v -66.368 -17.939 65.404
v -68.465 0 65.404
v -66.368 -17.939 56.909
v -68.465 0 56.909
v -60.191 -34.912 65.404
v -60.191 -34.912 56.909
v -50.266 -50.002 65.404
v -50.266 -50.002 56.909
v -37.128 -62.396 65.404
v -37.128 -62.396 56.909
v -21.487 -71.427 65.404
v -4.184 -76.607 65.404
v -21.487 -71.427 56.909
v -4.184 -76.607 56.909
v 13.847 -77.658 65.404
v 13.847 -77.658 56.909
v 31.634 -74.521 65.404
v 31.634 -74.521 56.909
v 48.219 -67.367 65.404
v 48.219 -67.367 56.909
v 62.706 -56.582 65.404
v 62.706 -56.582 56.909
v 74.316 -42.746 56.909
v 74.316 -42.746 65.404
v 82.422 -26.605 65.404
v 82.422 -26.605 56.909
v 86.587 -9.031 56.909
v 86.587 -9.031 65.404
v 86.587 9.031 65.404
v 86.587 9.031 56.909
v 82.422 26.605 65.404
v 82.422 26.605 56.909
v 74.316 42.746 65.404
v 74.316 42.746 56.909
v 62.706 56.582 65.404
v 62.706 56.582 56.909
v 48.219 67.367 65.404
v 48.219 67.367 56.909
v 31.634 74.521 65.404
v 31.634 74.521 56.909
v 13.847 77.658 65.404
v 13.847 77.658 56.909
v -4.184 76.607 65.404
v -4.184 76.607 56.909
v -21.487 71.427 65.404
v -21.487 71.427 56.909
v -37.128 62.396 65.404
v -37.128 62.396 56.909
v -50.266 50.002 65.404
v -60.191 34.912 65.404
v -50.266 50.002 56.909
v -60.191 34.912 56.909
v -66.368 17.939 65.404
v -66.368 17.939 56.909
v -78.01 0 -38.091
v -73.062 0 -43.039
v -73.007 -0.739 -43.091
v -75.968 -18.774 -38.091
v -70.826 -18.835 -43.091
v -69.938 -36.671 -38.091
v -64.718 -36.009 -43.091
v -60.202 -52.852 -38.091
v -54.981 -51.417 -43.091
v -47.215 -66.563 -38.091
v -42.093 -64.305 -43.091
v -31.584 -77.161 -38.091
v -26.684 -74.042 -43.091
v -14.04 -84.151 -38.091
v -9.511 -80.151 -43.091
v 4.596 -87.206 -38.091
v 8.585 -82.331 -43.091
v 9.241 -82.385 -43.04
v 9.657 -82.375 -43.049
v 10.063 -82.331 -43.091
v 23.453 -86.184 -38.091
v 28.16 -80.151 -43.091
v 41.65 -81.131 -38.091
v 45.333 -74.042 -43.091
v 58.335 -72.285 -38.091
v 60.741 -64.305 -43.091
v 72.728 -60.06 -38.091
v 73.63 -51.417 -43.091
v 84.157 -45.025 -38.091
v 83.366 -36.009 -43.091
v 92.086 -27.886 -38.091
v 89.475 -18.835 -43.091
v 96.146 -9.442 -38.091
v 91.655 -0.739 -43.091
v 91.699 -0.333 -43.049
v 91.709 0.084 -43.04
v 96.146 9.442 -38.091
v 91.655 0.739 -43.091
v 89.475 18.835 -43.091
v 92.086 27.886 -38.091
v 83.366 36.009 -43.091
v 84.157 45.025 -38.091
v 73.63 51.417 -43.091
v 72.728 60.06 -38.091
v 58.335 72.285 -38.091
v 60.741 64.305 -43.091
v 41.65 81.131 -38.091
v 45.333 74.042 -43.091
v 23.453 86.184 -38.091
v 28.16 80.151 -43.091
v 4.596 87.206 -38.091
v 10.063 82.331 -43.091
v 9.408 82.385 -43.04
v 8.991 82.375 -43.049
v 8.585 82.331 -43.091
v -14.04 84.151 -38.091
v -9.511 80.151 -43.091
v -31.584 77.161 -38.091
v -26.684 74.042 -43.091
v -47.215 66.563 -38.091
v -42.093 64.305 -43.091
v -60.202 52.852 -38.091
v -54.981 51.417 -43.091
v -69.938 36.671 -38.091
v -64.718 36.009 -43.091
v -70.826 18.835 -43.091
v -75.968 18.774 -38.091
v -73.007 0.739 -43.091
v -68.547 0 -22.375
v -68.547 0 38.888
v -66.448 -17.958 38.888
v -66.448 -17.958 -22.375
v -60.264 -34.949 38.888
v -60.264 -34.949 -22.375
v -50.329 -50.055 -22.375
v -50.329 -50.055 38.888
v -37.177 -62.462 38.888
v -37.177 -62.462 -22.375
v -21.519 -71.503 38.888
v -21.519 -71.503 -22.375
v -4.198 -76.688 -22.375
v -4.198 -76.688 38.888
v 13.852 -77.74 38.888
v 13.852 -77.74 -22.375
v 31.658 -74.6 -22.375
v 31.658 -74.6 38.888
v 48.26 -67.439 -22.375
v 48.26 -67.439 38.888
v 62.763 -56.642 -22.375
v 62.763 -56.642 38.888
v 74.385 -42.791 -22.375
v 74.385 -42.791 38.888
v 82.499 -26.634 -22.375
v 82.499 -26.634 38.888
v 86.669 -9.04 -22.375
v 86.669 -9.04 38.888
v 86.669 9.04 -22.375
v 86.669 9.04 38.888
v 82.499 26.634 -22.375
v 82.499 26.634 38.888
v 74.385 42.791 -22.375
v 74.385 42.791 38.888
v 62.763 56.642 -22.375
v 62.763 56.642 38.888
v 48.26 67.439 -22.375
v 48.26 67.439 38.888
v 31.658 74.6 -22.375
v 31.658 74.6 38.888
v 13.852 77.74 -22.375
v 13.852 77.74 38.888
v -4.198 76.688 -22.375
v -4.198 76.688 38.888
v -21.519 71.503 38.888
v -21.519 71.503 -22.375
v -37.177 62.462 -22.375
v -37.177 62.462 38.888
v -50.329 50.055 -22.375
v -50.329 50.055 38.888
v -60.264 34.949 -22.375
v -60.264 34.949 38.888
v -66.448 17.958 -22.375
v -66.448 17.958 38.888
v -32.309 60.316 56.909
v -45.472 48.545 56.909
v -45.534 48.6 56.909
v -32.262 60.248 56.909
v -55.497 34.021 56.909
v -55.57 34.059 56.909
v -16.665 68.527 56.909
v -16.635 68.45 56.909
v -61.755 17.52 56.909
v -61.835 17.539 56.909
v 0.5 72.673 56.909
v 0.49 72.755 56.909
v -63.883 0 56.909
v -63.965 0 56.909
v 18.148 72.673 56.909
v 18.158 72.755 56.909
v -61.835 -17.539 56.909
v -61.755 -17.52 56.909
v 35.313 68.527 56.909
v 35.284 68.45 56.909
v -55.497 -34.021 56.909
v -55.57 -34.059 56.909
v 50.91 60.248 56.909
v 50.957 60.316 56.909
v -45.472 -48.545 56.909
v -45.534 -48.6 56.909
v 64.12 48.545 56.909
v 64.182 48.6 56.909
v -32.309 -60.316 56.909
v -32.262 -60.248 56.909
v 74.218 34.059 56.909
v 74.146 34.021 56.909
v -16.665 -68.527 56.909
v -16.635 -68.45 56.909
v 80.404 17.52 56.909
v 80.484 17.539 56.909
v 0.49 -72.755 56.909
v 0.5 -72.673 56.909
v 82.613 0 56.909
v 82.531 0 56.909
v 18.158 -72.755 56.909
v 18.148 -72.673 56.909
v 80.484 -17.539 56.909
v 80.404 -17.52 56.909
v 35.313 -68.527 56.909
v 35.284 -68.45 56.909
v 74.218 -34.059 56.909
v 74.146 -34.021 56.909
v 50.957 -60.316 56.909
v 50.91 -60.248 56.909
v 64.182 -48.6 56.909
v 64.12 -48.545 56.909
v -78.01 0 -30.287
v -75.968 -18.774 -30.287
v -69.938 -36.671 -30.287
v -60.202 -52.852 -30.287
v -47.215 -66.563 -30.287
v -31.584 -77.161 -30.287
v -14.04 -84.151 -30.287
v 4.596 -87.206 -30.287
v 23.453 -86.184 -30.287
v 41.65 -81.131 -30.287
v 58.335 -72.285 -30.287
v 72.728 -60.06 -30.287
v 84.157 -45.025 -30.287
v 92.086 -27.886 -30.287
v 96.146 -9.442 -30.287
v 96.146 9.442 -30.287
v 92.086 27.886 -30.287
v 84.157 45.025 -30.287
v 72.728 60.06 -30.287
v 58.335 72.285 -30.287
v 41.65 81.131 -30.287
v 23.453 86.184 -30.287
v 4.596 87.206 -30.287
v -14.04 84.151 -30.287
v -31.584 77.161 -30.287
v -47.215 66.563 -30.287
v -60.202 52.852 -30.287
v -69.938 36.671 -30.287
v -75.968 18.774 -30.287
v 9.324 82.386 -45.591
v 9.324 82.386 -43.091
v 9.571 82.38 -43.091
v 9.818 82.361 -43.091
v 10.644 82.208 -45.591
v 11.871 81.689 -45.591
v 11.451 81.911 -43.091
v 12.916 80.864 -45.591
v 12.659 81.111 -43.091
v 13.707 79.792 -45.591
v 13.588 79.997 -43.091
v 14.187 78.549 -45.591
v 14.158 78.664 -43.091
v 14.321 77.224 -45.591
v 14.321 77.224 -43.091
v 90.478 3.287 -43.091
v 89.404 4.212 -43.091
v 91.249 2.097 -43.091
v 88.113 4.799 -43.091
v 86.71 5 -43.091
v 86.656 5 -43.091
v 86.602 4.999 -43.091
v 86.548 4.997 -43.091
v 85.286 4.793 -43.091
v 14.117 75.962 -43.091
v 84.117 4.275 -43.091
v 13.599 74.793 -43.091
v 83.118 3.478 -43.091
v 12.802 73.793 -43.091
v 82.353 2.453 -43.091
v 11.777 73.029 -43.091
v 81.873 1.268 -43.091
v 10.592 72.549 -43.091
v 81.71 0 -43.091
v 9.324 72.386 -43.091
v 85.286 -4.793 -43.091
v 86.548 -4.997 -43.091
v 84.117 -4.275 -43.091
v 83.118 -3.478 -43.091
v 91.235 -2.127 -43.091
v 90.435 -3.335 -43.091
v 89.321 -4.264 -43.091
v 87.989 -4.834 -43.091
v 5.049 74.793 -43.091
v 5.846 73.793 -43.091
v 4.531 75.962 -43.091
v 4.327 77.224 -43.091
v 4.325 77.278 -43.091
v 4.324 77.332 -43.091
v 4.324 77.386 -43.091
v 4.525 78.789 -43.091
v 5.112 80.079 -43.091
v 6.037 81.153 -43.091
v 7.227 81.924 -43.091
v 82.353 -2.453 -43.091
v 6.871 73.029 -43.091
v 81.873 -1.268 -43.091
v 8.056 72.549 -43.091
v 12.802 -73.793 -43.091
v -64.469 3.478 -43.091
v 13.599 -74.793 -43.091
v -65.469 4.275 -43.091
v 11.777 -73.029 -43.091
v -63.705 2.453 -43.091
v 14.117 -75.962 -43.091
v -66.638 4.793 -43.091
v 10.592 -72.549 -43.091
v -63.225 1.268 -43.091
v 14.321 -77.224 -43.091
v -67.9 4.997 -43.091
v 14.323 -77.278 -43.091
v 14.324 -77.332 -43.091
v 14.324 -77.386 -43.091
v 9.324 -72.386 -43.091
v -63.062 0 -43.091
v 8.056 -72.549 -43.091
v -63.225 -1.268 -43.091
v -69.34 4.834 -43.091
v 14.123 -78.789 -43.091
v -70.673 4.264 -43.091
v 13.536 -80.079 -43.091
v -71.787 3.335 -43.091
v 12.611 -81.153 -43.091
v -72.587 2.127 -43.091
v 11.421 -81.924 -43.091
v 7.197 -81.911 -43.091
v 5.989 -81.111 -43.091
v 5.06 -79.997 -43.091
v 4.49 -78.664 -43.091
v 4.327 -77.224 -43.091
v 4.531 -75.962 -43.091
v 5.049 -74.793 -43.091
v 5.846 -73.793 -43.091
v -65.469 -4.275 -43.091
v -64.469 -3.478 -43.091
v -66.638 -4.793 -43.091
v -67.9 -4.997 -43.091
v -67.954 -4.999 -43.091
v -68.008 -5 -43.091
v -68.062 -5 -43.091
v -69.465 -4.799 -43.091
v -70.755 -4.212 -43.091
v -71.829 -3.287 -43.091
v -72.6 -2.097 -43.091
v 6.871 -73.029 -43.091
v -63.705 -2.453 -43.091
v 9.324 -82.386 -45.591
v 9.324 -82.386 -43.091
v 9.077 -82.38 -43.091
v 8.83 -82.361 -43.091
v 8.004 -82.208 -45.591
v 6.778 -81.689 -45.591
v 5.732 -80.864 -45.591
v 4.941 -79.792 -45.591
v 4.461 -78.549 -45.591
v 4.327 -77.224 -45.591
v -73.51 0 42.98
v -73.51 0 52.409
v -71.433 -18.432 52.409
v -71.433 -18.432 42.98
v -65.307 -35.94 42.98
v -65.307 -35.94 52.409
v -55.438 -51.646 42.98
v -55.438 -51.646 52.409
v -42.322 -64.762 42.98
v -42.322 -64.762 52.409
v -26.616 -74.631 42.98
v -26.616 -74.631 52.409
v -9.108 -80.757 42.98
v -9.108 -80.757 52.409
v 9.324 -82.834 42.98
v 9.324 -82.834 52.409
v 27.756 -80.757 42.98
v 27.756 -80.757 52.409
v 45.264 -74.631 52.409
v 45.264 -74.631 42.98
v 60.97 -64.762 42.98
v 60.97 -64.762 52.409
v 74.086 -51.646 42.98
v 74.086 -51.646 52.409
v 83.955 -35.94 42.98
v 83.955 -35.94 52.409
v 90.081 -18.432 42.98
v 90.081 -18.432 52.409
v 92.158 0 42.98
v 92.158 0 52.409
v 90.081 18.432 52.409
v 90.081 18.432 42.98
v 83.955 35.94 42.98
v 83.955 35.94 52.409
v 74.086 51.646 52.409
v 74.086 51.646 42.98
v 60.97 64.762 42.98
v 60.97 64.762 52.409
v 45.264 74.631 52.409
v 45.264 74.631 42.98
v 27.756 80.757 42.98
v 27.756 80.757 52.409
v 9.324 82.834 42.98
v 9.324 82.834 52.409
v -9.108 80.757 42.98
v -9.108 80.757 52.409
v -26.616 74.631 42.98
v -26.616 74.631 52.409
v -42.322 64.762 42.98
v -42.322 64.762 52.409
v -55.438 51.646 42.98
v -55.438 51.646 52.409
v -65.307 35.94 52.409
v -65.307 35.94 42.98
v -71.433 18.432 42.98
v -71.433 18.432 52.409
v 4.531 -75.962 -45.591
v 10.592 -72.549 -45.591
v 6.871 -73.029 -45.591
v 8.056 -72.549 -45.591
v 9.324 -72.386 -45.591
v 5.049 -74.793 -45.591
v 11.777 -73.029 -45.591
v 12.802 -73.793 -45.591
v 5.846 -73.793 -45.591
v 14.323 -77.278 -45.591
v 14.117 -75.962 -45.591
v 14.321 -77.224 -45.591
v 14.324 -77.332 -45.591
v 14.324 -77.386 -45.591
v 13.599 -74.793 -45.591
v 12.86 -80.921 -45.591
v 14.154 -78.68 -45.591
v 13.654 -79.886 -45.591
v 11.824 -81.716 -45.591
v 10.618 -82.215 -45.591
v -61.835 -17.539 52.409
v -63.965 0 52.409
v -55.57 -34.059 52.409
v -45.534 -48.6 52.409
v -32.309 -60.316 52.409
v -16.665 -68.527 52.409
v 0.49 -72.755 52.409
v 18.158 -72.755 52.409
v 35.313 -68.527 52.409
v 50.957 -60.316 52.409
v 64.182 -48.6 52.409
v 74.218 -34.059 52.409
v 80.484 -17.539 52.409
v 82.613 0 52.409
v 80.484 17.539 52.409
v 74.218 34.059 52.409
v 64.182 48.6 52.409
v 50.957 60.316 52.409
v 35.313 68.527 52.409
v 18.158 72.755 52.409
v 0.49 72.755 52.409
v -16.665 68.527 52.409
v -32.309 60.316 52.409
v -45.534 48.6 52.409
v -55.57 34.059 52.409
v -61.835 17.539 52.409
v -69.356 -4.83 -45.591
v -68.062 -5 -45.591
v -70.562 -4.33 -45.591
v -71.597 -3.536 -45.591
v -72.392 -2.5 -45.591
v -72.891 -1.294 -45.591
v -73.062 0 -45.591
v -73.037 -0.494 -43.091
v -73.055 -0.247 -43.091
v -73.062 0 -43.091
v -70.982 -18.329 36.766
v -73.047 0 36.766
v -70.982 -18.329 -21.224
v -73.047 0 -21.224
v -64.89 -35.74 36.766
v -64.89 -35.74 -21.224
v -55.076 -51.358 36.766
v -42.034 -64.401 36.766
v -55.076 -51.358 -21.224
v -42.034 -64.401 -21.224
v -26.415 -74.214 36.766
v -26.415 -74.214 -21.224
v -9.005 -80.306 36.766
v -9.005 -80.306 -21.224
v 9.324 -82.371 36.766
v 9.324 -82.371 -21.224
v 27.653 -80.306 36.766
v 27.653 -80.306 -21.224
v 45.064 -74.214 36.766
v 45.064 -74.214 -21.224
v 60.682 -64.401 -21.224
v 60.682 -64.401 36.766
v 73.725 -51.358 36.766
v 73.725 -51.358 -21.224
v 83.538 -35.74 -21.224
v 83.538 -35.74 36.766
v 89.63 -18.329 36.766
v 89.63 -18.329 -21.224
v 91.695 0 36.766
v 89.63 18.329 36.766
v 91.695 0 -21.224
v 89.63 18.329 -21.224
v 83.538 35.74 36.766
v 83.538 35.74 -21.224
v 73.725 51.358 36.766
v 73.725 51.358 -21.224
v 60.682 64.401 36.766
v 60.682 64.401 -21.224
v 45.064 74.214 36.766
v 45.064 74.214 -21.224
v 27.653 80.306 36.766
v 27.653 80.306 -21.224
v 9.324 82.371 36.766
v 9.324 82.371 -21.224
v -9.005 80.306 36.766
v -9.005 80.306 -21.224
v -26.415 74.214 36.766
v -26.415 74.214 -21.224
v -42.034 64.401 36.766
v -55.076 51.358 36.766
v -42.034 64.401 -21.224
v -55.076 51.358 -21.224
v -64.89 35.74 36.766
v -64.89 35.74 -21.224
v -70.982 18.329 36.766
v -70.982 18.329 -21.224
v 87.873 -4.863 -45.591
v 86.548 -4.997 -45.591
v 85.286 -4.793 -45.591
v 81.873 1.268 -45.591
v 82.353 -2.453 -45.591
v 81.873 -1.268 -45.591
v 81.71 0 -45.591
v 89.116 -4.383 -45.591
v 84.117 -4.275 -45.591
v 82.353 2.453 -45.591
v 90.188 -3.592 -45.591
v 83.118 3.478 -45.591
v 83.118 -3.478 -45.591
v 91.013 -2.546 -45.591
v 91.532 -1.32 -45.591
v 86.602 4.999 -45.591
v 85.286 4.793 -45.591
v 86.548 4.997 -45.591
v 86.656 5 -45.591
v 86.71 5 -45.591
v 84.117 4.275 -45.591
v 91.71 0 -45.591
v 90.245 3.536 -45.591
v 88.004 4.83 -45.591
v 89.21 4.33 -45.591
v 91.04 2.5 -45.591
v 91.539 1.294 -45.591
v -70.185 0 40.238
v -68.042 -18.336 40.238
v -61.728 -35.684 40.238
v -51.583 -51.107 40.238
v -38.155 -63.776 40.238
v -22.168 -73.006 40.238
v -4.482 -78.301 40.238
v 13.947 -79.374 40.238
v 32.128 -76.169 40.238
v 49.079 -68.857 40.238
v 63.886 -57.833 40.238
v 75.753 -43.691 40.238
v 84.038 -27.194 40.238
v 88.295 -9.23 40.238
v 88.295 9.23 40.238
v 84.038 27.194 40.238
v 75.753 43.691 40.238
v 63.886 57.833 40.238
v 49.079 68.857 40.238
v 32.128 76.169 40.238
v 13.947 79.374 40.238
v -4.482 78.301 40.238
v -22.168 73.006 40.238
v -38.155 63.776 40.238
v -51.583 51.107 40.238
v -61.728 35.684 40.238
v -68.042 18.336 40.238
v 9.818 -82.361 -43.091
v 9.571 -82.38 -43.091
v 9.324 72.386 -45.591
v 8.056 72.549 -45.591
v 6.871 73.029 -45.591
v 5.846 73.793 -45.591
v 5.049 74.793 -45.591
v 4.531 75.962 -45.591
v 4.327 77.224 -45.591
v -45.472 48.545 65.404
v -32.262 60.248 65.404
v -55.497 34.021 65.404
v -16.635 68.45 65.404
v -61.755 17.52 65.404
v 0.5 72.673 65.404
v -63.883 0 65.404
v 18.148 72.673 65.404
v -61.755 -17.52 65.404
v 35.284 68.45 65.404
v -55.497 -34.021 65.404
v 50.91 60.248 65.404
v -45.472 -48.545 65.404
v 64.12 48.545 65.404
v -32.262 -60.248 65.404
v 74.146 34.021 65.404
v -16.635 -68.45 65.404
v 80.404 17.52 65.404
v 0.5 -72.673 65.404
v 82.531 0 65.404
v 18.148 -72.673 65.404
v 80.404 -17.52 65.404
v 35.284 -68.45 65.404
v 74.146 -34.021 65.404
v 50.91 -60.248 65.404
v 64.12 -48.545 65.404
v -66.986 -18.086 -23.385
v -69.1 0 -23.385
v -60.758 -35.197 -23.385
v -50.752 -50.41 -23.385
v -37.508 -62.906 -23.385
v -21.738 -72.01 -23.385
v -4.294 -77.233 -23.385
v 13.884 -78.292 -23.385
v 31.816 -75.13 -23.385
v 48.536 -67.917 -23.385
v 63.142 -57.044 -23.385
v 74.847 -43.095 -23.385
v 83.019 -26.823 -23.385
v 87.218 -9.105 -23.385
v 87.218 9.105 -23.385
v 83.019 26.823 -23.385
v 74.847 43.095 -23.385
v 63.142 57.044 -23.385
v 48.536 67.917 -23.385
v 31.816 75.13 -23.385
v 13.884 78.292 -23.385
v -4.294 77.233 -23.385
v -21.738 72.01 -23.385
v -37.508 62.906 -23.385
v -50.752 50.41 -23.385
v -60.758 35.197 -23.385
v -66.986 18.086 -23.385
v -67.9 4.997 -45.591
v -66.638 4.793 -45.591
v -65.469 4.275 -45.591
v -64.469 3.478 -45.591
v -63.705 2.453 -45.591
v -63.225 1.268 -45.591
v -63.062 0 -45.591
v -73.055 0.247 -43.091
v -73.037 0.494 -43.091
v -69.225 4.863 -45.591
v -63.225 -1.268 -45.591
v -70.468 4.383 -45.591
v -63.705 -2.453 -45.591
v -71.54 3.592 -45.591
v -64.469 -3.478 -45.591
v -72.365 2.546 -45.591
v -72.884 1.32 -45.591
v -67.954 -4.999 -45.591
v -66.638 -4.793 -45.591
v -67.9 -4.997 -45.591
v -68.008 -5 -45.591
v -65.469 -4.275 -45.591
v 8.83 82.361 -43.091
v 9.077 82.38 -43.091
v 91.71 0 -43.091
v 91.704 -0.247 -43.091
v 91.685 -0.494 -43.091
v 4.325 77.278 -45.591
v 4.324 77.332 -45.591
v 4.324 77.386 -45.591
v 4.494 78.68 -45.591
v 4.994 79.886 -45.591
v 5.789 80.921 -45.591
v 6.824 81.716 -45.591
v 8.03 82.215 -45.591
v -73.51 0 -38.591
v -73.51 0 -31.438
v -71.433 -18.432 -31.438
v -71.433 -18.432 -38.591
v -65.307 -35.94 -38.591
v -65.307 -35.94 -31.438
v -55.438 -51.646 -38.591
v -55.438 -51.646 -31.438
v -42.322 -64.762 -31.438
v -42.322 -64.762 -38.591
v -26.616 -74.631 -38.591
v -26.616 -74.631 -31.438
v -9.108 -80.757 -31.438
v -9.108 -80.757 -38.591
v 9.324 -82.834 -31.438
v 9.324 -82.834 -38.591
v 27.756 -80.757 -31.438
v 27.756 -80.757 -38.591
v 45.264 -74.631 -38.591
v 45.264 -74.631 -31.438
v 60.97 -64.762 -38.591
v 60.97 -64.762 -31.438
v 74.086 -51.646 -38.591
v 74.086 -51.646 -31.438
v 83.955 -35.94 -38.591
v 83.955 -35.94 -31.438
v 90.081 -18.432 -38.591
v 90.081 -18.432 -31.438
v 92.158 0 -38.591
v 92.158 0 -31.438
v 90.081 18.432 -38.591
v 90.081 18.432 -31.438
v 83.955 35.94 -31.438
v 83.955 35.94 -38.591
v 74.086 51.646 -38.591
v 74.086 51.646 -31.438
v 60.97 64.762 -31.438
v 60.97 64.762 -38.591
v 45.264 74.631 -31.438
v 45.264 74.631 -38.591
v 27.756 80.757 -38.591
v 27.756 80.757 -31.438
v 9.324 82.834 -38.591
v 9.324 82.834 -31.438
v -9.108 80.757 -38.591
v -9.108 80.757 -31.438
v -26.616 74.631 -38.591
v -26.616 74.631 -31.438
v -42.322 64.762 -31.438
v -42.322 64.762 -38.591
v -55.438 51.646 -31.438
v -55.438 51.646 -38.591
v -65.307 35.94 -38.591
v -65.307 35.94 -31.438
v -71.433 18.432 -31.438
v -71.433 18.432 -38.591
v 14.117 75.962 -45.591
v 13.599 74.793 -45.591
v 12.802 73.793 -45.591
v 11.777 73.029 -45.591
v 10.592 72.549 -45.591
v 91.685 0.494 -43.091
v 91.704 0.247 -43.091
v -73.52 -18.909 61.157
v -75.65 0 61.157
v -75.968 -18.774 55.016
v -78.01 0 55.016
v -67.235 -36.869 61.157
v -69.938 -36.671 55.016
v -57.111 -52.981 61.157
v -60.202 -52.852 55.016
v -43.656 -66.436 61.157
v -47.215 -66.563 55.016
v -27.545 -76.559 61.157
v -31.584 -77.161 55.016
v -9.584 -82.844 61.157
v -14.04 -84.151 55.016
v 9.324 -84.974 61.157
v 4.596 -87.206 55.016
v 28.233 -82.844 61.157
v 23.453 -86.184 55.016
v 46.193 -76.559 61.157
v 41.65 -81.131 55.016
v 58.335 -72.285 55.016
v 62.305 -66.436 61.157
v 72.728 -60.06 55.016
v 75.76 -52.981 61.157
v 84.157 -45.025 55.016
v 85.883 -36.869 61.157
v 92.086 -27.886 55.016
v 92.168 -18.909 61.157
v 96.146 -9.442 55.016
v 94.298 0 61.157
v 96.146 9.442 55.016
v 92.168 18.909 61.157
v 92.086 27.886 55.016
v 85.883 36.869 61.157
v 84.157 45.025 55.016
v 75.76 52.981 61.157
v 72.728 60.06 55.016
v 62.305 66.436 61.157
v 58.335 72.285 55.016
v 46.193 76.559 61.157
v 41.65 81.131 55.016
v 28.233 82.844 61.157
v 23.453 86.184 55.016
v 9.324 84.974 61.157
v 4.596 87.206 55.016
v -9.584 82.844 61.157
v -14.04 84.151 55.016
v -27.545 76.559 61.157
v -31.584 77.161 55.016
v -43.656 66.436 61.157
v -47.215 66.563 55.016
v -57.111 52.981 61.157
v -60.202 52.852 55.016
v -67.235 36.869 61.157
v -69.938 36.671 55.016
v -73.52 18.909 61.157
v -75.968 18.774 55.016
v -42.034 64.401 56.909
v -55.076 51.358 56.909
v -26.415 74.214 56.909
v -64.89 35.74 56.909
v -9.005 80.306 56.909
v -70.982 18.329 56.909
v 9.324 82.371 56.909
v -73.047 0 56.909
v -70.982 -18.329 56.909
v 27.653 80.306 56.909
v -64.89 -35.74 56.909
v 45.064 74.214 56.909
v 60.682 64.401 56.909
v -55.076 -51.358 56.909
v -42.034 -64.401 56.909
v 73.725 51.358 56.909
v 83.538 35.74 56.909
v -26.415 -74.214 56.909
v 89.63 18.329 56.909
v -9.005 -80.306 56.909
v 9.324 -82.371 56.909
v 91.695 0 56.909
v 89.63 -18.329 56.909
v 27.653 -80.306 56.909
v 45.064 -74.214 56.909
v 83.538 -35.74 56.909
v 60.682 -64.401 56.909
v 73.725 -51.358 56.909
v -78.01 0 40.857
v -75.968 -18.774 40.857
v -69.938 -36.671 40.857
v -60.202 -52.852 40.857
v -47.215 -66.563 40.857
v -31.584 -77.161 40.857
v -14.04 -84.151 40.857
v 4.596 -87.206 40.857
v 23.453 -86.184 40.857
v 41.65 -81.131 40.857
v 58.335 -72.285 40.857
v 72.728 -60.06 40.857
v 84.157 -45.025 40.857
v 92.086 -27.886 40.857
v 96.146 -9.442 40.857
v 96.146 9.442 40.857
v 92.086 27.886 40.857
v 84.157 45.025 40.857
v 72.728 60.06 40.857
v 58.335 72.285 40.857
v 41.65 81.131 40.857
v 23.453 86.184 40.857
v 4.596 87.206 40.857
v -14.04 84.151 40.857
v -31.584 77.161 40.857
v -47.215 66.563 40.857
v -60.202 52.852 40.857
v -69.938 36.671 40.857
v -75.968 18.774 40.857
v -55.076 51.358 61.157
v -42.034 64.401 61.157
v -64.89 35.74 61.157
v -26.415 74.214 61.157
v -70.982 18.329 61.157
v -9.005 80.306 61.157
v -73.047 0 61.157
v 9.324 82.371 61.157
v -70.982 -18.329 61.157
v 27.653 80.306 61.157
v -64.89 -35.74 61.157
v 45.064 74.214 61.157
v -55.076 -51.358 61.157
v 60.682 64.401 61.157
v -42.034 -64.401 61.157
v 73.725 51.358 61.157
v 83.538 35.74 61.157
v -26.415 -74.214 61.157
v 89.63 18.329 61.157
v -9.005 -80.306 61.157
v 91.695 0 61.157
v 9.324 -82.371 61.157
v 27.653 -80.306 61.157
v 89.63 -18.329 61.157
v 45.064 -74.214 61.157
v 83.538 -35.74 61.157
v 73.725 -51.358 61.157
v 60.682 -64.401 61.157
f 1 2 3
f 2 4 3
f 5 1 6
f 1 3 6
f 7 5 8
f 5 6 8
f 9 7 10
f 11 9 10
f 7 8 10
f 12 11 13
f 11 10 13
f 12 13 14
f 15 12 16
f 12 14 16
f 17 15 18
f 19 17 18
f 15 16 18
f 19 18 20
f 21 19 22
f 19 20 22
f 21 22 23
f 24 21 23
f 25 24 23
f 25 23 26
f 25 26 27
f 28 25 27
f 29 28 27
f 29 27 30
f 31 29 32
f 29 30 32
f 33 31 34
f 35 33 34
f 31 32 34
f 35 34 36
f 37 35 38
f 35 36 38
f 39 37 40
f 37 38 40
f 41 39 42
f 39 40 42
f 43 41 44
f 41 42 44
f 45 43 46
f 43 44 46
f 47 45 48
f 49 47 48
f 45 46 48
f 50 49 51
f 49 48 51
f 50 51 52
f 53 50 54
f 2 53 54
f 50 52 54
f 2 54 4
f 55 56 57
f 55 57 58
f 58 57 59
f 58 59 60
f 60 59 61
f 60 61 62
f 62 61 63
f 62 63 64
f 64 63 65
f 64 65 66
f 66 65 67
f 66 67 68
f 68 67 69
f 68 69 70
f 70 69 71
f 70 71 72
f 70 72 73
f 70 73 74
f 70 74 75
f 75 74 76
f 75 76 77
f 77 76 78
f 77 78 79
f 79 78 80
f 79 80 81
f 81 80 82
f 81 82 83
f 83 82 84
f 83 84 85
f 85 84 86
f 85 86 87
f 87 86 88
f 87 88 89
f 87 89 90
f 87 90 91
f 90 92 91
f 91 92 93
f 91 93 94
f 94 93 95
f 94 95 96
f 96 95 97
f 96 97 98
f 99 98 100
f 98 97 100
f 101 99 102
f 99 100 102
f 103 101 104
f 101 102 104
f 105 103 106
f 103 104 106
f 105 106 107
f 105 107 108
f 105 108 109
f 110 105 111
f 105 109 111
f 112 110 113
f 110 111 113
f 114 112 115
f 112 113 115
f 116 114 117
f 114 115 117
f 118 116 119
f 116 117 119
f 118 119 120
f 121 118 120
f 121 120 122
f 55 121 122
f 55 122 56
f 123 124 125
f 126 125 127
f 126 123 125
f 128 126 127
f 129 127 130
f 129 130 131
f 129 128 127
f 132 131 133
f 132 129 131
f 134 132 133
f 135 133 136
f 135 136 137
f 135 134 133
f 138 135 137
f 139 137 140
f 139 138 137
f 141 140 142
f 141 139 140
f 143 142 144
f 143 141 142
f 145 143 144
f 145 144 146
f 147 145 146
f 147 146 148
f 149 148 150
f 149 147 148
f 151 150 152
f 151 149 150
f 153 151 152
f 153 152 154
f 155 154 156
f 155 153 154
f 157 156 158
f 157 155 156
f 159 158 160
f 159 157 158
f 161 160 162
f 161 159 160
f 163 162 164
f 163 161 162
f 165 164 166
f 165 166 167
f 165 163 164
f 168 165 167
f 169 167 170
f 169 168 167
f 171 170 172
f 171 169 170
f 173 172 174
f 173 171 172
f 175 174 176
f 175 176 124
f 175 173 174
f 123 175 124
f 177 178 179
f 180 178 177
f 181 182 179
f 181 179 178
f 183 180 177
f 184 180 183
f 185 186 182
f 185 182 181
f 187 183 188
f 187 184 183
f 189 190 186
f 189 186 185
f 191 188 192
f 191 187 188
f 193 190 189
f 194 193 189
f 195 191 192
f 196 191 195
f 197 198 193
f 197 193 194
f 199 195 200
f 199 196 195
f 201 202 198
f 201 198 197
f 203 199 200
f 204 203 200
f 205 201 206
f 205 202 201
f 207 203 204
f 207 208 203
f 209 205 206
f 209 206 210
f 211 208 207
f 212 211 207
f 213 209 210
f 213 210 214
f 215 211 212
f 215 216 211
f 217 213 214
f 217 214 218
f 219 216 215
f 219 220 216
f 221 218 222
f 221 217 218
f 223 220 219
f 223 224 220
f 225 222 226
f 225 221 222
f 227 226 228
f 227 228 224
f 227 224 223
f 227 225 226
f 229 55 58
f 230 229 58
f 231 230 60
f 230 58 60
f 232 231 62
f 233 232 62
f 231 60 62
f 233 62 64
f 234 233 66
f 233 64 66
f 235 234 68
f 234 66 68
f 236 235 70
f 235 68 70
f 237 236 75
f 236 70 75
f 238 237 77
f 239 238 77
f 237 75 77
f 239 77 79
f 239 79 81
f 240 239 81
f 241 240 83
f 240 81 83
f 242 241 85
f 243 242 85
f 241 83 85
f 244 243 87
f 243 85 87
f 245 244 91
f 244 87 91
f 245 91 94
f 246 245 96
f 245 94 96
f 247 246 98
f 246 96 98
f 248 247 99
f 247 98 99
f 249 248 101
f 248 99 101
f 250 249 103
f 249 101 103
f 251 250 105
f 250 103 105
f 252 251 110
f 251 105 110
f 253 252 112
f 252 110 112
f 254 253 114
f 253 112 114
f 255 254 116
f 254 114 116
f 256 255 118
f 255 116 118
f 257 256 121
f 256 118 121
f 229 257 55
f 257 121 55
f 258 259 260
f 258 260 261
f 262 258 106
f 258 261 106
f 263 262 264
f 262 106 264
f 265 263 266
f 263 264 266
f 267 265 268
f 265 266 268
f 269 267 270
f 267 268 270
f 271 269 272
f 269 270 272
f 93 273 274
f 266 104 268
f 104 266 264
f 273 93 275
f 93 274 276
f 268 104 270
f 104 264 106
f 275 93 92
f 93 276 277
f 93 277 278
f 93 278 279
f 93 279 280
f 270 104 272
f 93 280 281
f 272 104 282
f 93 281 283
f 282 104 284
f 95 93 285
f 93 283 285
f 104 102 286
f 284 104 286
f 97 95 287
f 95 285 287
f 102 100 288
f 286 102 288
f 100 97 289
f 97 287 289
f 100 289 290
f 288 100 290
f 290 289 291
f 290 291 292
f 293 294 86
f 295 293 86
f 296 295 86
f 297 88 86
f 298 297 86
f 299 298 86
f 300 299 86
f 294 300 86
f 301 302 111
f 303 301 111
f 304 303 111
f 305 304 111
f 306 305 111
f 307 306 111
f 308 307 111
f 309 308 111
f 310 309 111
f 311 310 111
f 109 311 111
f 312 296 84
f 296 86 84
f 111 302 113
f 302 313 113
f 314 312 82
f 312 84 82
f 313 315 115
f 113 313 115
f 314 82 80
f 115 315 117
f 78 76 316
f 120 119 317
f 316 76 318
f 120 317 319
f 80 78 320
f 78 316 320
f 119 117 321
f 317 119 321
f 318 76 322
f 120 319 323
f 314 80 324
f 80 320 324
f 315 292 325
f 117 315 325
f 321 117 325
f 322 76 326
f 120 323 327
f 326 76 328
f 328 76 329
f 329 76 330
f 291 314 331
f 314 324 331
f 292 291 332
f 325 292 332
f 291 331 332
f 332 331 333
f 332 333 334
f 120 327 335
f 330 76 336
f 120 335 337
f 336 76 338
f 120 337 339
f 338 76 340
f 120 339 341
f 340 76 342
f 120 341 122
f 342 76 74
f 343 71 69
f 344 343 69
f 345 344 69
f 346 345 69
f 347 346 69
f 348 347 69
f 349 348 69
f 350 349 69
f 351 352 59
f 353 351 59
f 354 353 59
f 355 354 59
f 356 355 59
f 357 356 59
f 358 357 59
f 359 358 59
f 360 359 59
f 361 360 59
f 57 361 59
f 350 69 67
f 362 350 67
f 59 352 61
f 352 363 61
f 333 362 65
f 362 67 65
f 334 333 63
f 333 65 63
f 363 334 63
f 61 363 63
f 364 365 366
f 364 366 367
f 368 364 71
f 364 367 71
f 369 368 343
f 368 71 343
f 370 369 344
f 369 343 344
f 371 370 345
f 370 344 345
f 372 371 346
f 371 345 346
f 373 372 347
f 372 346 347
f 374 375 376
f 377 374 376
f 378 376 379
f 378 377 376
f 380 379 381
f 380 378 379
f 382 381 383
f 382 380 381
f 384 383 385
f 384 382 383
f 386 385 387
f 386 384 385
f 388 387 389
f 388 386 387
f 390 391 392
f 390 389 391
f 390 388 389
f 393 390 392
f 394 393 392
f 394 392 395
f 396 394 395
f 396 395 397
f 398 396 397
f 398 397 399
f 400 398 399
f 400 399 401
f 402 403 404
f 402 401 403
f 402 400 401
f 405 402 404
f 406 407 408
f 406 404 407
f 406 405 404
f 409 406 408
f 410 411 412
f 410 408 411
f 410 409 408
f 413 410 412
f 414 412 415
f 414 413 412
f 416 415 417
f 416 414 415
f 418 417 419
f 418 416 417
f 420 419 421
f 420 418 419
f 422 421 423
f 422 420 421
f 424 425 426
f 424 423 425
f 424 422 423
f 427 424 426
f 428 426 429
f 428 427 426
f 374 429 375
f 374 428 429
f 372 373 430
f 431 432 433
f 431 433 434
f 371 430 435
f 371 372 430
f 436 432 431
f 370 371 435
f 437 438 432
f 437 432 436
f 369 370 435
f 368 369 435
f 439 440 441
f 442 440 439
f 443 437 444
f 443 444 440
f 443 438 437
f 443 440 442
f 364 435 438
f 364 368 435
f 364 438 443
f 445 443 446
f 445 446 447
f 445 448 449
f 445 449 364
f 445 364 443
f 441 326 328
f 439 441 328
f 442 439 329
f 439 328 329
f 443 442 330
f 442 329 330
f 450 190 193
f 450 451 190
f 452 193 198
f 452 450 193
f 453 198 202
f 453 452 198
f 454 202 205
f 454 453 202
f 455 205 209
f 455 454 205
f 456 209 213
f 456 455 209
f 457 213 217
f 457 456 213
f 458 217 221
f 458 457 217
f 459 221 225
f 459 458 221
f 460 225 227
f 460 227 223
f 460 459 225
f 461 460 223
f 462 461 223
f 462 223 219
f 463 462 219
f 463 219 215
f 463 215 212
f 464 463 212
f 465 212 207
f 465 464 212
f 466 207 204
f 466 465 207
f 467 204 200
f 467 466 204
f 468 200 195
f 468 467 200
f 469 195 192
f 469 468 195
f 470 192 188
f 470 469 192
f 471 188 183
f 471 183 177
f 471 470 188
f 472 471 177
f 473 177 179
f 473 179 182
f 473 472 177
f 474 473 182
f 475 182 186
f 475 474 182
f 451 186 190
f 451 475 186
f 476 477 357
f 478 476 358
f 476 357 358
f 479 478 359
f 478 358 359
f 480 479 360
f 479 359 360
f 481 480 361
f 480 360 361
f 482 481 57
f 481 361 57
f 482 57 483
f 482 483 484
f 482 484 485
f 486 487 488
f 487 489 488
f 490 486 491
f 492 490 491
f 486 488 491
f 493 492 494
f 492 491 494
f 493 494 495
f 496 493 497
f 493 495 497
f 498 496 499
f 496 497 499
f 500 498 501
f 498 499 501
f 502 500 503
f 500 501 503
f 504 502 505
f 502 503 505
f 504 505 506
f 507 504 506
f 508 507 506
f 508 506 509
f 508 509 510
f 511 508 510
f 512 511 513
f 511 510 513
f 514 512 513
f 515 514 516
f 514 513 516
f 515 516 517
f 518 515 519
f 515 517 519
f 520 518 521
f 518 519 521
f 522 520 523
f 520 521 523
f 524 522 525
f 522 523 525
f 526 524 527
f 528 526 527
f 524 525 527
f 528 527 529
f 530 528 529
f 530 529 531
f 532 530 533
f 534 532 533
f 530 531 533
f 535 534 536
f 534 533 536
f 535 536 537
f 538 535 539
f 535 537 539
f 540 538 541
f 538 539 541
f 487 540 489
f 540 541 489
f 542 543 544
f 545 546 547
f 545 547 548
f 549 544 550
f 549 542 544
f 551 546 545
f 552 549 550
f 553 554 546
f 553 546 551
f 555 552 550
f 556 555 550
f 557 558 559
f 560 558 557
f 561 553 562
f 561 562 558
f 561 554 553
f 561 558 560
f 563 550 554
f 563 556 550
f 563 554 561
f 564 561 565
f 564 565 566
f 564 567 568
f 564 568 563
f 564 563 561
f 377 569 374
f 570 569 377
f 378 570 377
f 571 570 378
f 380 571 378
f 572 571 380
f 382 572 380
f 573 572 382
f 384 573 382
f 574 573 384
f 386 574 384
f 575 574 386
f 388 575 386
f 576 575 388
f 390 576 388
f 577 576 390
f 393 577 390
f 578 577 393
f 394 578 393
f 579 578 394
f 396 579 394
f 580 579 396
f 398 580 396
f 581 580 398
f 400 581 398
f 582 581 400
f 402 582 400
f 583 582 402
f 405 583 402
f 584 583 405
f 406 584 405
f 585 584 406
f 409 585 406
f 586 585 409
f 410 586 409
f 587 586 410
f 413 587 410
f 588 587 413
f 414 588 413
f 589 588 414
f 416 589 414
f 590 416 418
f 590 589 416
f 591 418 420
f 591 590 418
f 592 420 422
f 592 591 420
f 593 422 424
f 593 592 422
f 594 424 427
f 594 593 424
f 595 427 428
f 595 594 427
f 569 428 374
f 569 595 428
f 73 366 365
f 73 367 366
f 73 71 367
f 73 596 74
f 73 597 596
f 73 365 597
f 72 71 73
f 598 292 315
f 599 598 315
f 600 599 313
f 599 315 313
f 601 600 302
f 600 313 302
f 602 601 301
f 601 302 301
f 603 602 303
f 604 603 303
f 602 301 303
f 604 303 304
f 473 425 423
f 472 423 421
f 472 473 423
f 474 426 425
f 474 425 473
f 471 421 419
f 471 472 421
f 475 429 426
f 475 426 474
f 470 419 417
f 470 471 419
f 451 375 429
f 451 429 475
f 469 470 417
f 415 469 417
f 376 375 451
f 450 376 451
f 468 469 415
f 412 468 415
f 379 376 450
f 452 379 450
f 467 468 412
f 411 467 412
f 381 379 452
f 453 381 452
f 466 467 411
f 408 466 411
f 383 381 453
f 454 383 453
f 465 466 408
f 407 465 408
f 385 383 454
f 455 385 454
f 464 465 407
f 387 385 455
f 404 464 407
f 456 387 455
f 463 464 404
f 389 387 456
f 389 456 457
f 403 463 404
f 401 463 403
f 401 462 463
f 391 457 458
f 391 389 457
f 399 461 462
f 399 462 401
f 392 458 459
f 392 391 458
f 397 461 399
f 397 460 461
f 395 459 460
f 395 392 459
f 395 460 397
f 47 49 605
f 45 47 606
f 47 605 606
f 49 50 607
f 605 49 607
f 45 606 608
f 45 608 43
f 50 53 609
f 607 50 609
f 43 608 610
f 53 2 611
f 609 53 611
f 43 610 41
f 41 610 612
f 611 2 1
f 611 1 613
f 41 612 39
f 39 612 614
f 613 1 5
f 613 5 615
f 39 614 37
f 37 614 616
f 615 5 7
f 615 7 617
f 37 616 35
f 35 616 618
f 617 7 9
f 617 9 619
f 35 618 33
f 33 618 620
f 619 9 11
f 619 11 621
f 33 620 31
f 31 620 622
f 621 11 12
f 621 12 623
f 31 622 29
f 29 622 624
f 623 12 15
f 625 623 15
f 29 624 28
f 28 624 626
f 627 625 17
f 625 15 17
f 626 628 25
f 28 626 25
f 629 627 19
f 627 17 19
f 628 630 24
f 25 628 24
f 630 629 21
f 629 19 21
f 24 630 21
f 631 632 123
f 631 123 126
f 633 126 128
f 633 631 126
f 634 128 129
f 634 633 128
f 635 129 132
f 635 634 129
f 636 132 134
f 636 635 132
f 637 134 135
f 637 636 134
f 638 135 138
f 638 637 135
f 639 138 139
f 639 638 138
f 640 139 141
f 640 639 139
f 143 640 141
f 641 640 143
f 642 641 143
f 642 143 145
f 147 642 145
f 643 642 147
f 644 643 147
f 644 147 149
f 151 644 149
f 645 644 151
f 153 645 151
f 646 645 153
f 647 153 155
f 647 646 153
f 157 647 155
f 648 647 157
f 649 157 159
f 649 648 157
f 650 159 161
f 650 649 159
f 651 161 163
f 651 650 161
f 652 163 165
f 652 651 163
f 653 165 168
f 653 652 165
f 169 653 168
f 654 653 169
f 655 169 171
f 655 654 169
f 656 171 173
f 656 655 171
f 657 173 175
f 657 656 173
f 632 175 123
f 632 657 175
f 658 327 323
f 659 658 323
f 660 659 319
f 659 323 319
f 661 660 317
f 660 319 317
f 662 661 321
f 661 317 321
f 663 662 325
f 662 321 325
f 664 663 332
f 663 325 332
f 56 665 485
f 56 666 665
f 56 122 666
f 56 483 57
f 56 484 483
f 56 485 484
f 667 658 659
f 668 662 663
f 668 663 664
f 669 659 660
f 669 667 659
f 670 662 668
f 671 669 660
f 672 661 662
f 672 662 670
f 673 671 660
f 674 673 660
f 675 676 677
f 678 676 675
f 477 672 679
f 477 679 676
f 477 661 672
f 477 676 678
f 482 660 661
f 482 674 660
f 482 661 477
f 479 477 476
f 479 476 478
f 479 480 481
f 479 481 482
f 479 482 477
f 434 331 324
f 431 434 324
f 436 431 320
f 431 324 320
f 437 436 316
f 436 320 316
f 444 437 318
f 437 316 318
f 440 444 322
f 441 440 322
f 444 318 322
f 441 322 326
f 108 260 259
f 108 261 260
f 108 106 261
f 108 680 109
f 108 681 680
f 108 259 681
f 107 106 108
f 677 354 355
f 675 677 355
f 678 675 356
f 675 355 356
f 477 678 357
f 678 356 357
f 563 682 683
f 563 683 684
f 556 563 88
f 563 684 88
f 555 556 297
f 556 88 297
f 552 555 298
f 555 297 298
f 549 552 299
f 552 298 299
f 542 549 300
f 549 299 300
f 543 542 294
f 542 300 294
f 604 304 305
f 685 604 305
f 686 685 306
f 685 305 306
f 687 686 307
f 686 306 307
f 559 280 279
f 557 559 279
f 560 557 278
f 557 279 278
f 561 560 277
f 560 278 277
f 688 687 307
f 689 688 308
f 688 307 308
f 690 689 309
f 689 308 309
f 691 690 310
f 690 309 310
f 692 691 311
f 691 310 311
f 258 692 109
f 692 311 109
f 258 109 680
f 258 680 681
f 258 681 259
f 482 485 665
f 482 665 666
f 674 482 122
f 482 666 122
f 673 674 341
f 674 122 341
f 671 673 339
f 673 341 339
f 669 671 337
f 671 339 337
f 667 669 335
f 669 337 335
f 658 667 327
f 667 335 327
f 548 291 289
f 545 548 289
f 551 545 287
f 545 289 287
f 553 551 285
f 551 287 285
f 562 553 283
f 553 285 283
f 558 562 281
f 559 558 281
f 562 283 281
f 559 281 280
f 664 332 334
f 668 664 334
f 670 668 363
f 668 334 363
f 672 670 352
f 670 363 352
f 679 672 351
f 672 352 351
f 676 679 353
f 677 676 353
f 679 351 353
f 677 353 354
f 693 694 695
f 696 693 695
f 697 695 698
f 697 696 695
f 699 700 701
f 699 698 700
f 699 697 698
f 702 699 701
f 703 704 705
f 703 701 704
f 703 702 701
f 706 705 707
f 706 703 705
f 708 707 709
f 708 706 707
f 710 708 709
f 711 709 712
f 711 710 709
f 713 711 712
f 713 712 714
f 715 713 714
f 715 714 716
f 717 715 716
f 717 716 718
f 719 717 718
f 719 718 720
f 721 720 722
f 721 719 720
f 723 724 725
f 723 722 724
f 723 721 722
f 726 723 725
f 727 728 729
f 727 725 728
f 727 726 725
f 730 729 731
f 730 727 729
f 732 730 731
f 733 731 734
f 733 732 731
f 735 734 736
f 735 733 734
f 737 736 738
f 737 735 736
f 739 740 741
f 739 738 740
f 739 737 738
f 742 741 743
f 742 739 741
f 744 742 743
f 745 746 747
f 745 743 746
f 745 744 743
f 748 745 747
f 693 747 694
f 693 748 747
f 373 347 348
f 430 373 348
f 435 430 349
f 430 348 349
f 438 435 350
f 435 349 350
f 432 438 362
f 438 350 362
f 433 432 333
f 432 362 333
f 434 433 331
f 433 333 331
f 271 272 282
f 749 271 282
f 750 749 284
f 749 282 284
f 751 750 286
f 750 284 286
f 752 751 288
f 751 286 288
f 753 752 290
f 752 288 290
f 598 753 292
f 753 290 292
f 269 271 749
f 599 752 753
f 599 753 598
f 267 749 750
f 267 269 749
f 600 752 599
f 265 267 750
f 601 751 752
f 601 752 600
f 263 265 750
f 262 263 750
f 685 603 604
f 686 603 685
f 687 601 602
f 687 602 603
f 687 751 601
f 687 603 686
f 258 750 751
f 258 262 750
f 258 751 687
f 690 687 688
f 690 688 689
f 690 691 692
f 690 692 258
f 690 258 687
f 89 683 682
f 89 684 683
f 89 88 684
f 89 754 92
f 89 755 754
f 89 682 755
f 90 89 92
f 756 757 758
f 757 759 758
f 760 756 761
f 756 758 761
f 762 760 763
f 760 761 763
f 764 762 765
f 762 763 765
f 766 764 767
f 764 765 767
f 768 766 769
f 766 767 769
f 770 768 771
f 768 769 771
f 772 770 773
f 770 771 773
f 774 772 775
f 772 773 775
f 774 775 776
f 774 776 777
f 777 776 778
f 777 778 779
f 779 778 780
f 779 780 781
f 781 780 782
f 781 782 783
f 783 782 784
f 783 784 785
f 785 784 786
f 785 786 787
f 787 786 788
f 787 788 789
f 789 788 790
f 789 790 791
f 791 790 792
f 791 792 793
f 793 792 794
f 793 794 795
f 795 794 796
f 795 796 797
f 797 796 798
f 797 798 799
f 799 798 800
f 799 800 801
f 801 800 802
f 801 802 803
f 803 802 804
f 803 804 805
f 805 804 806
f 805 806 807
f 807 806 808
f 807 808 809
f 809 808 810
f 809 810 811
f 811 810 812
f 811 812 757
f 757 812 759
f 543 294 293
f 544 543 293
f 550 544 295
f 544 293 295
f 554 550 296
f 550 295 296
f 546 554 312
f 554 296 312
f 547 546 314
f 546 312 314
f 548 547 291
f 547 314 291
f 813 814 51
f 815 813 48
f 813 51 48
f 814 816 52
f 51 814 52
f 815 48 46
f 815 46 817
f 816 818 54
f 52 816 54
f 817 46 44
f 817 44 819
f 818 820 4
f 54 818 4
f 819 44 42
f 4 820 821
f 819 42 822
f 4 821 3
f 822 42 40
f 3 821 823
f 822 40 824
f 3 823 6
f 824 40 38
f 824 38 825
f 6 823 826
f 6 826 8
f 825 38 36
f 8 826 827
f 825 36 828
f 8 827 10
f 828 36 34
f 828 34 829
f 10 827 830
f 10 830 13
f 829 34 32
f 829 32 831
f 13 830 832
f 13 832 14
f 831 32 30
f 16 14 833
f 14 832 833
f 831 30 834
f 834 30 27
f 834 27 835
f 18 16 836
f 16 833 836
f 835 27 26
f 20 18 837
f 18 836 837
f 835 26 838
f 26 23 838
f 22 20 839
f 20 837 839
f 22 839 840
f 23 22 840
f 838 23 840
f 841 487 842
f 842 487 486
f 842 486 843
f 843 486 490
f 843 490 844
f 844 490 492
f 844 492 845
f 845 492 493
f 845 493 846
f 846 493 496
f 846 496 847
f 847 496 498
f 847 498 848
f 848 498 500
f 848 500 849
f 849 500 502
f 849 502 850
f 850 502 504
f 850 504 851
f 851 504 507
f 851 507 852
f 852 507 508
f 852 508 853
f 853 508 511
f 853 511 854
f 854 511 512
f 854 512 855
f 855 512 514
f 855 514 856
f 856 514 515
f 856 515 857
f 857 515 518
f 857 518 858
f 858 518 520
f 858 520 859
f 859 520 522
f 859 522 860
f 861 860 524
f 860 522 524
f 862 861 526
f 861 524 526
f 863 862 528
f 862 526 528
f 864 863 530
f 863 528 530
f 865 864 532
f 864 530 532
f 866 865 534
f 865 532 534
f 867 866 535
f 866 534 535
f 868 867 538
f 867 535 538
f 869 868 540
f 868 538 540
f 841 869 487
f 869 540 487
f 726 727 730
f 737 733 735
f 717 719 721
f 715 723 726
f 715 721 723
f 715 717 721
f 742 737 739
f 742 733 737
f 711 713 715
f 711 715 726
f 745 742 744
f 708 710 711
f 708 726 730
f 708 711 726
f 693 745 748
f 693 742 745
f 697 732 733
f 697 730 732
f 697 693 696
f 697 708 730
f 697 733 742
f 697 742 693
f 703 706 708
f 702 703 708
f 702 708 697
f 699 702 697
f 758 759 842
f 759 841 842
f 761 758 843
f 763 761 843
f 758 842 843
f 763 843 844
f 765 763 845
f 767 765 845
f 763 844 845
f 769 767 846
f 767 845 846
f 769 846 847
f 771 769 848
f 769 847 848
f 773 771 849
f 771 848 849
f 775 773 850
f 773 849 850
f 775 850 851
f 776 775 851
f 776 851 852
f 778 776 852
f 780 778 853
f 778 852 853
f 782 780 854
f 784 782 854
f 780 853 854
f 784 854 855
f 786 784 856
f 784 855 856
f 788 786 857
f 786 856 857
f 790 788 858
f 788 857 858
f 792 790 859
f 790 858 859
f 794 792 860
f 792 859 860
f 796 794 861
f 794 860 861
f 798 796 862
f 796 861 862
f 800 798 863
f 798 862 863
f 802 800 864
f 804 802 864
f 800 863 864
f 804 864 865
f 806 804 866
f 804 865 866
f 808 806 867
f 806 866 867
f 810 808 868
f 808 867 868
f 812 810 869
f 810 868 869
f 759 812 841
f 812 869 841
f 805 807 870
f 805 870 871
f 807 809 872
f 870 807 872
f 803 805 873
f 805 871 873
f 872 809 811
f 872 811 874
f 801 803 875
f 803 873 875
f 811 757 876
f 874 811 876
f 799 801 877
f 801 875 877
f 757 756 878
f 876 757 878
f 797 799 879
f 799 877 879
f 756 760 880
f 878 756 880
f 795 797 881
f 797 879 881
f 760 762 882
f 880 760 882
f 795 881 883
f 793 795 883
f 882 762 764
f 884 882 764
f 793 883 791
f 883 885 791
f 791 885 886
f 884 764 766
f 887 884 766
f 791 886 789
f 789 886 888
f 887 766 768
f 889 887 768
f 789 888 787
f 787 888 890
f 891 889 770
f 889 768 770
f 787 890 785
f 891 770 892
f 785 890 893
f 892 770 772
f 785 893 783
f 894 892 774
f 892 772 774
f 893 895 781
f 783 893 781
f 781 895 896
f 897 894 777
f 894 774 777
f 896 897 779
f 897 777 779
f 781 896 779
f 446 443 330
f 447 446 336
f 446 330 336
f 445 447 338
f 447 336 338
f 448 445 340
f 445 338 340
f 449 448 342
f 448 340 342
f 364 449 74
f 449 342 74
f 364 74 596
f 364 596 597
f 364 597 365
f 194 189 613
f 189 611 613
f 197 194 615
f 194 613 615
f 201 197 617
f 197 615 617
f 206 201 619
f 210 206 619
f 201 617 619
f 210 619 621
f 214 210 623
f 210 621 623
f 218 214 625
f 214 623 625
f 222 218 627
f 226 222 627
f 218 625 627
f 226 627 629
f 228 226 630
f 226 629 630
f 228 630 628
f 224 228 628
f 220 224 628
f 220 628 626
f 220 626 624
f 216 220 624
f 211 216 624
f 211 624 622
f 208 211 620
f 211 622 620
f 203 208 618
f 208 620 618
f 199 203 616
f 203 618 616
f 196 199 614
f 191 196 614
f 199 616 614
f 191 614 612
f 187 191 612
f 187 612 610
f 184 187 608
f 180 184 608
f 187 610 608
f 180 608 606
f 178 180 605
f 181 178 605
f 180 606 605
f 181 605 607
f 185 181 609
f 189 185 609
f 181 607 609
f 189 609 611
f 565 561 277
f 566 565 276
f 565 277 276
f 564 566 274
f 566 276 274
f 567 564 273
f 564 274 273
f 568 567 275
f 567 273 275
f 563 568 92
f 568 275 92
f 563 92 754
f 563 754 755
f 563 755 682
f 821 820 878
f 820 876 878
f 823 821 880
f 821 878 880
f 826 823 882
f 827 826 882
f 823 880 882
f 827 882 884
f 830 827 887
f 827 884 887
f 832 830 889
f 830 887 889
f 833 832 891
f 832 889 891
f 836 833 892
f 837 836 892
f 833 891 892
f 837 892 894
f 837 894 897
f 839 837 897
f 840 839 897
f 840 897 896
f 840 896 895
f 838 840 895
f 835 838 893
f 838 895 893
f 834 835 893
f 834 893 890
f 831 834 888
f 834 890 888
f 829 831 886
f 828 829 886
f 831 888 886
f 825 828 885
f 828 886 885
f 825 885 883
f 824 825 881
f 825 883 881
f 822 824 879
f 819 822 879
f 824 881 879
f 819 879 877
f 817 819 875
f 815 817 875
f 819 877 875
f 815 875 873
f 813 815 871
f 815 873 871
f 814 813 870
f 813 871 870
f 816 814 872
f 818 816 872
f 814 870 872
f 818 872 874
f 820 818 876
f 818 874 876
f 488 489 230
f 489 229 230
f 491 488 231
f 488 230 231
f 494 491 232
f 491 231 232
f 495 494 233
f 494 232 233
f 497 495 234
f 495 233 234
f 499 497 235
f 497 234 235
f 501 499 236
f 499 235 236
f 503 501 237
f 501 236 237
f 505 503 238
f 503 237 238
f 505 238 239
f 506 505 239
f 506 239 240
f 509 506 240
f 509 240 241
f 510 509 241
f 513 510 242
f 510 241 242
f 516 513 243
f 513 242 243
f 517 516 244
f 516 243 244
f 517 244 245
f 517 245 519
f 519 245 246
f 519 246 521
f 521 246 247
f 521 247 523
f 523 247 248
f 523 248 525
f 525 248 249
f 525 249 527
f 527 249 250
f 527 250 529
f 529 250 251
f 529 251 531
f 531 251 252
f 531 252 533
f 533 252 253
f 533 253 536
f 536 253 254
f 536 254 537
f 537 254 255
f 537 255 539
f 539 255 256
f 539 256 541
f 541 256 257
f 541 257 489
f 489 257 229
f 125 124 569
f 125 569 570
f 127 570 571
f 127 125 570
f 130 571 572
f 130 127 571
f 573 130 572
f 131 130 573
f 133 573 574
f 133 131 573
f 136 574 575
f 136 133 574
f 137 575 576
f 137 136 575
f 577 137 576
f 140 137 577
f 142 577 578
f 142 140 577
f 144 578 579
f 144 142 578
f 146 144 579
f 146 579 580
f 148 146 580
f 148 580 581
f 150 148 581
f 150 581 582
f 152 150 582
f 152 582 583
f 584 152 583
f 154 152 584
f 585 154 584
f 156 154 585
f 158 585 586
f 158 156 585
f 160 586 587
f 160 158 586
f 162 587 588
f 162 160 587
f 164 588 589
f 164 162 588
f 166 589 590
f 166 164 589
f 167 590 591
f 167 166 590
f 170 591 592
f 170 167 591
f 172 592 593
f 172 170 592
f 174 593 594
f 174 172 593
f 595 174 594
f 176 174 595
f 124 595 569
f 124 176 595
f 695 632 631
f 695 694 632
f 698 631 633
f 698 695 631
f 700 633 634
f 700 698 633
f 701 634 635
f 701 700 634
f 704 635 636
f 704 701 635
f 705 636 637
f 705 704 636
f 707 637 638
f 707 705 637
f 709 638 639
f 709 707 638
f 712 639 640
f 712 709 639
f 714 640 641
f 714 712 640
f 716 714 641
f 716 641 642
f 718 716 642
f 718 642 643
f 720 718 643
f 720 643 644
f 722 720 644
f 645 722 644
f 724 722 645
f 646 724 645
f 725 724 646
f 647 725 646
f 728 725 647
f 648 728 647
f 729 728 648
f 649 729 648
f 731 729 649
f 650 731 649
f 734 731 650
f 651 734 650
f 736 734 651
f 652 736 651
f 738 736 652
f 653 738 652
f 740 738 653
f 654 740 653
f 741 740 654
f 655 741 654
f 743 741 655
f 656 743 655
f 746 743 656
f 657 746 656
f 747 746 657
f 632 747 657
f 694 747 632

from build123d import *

# Parameters (mm, degrees)
F2_T            = 4.5
F4_DEPTH        = 2.5
F4_COPIES_COUNT = 4
F5_S5_R         = 5
F5_T6_DEPTH     = 125
F5_S7_R         = 5
F5_T8_DEPTH     = 125
F5_S9_R         = 5
F5_T10_DEPTH    = 125
F5_S11_R        = 5
F5_T12_DEPTH    = 125


# Not quite as in the source:
# - a fillet or chamfer that OpenCascade refuses, or shapes differently, is made with other operations: its cross-section is extruded or revolved along the edge and cut away or added
# - a pattern or mirror of a feature is missing from the dataset's text; its kind, count and spacing are read off the source's solid
# - a shell that OpenCascade refuses in one call is made with other operations: the cavity is built on its own and cut out


with BuildPart() as f1:
    # F0 (on Front) → F1 (revolve)
    with BuildSketch(Plane.XZ):
        Polygon((9.3241020494, -43.0905388618), (9.3241020494, 56.9094611382), (-63.8827484445, 56.9094611382), (-63.8827484445, 65.4041709328), (-68.4650088725, 65.4041709328), (-68.4650088725, 56.9094611382), (-73.0472693004, 56.9094611382), (-73.0472693004, 61.1568160355), (-75.6501782344, 61.1568160355), (-78.0099242383, 55.0157746972), (-78.0099242383, 40.8573164567), (-73.0472693004, 36.7660618934), (-73.0472693004, -21.2237248131), (-78.0099242383, -30.2868788943), (-78.0099242383, -43.0905388618), align=None)
    revolve(axis=Axis((9.3241020494, 0, 6.9094611382), (0, 0, 1)))

    # F2: shell of thickness 4.5, made by hand


with BuildPart() as f2_core1:
    # F2_t2: copy of F1
    add(f1.part)

    # the walls: a layer under each face that stays
    f2_faces = [f2_core1.faces().sort_by_distance(p)[0] for p in [
        (82.5309525433, 0, 61.1568160355),
        (-42.5353052318, 51.8594072813, 65.4041709328),
        (87.1132129713, 0, 61.1568160355),
        (-67.5558445438, 21.9656990266, 56.9094611382),
        (91.6954733993, 0, 59.0331385869),
        (-69.9852262155, 22.6598080757, 61.1568160355),
        (95.4782553352, 0, 58.0862953663),
        (96.6581283371, 0, 47.936545577),
        (94.1768008682, 0, 38.8116891751),
        (91.6954733993, 0, 7.7711685402),
        (94.1768008682, 0, -25.7553018537),
        (96.6581283371, 0, -36.688708878),
        (9.3241020494, 0, -43.0905388618),
    ]]
    thicken(f2_faces, amount=-F2_T, mode=Mode.SUBTRACT)

    # F2_s3 → F2_t4 (revolve, cut)
    with BuildSketch(Plane.XZ):
        Polygon((-68.5100088725, 56.9544611382), (-63.9650088725, 56.9094611382), (-63.9650088725, 52.4094611382), (-68.4650088725, 52.4094611382), align=None)
    revolve(axis=Axis((9.3241020494, 0, 56.9094611382), (0, 0, 1)), mode=Mode.SUBTRACT)

    # F2_s5 → F2_t6 (revolve, cut)
    with BuildSketch(Plane.XZ):
        Polygon((-73.0022693004, 56.9544611382), (-73.0472693004, 52.4094611382), (-77.5472693004, 52.4094611382), (-77.5472693004, 56.9094611382), align=None)
    revolve(axis=Axis((9.3241020494, 0, 56.9094611382), (0, 0, 1)), mode=Mode.SUBTRACT)

    # F2_s7 → F2_t8 (revolve, cut)
    with BuildSketch(Plane.XZ):
        Polygon((-73.1208943097, 36.731340015), (-70.1847683719, 40.2382497389), (-68.5472693004, 38.8882817011), (-68.5472693004, 36.7660618934), align=None)
    revolve(axis=Axis((9.3241020494, 0, 36.7660618934), (0, 0, 1)), mode=Mode.SUBTRACT)

    # F2_s9 → F2_t10 (revolve, cut)
    with BuildSketch(Plane.XZ):
        Polygon((-73.1317395514, -21.2021123331), (-68.5472693004, -21.2237248131), (-68.5472693004, -22.375090633), (-69.1002442047, -23.3849728075), align=None)
    revolve(axis=Axis((9.3241020494, 0, -21.2237248131), (0, 0, 1)), mode=Mode.SUBTRACT)


with BuildPart() as f1_1:
    add(f1.part)

    # what is left inside the walls is the cavity
    f2_cavity = [f2_core1.part.solids().sort_by_distance(p)[0] for p in [
        (87.150473, 0, 18.467158),
    ]]
    add(f2_cavity, mode=Mode.SUBTRACT)

    # F3 (on face) → F4 (join)
    with BuildSketch(Plane(origin=(0, 0, -43.0905388618), x_dir=(1, 0, 0), z_dir=(0, 0, -1))):
        with BuildLine():
            ThreePointArc((9.3241020494, 77.3856560126), (11.8241020494, 77.3452633101), (14.3214922181, 77.2241273697))
            ThreePointArc((14.3214922181, 77.2241273697), (14.323449549, 77.30488115), (14.3241020494, 77.3856560126))
            ThreePointArc((14.3241020494, 77.3856560126), (12.8596359554, 80.9211899185), (9.3241020494, 82.3856560126))
            Line((9.3241020494, 82.3856560126), (9.3241020494, 77.3856560126))
        make_face()
        with BuildLine():
            Line((9.3241020494, 77.3856560126), (9.3241020494, 72.3856560126))
            ThreePointArc((9.3241020494, 72.3856560126), (12.8020581148, 73.7934670411), (14.3214922181, 77.2241273697))
            ThreePointArc((14.3214922181, 77.2241273697), (11.8241020494, 77.3452633101), (9.3241020494, 77.3856560126))
        make_face()
        with BuildLine():
            ThreePointArc((4.3267118808, 77.2241273697), (5.8461459841, 73.7934670411), (9.3241020494, 72.3856560126))
            Line((9.3241020494, 72.3856560126), (9.3241020494, 77.3856560126))
            ThreePointArc((9.3241020494, 77.3856560126), (6.8241020494, 77.3452633101), (4.3267118808, 77.2241273697))
        make_face()
        with BuildLine():
            ThreePointArc((9.3241020494, 82.3856560126), (5.7319130779, 80.863612078), (4.3267118808, 77.2241273697))
            ThreePointArc((4.3267118808, 77.2241273697), (6.8241020494, 77.3452633101), (9.3241020494, 77.3856560126))
            Line((9.3241020494, 77.3856560126), (9.3241020494, 82.3856560126))
        make_face()
    f4 = extrude(amount=F4_DEPTH)

    # F4_copies: F4 ×4 about axis
    f4_copies_axis = Axis((9.324102, 0, 0), (0, 0, 1))
    for i in range(1, F4_COPIES_COUNT):
        add(f4.rotate(f4_copies_axis, i * 360 / F4_COPIES_COUNT))

    # F5: chamfer of 5 on 1 edges, made by hand


with BuildPart() as f5_tool2:
    # F5_s3 → F5_t4 (revolve)
    with BuildSketch(Plane.XZ):
        Polygon((-78.0099242383, -38.0905388618), (-73.0099242383, -43.0905388618), (-78.0099242383, -43.0905388618), align=None)
    revolve(axis=Axis((9.3241020494, 0, -43.0905388618), (0, 0, 1)))

    # F5_s5 → F5_t6 (cut, symmetric)
    with BuildSketch(Plane.XY.offset(-40.6)):
        with Locations((86.7097580126, 4.94e-08)):
            Circle(F5_S5_R)
    extrude(amount=F5_T6_DEPTH, both=True, mode=Mode.SUBTRACT)

    # F5_s7 → F5_t8 (cut, symmetric)
    with BuildSketch(Plane.XY.offset(-40.6)):
        with Locations((9.3241019506, 77.3856560126)):
            Circle(F5_S7_R)
    extrude(amount=F5_T8_DEPTH, both=True, mode=Mode.SUBTRACT)

    # F5_s9 → F5_t10 (cut, symmetric)
    with BuildSketch(Plane.XY.offset(-40.6)):
        with Locations((9.3241020494, -77.3856560126)):
            Circle(F5_S9_R)
    extrude(amount=F5_T10_DEPTH, both=True, mode=Mode.SUBTRACT)

    # F5_s11 → F5_t12 (cut, symmetric)
    with BuildSketch(Plane.XY.offset(-40.6)):
        with Locations((-68.0615540126, -4.94e-08)):
            Circle(F5_S11_R)
    extrude(amount=F5_T12_DEPTH, both=True, mode=Mode.SUBTRACT)


with BuildPart() as f1_2:
    add(f1_1.part)

    # F5_t1: cut F5_tool2
    add(f5_tool2.part, mode=Mode.SUBTRACT)


solid = f1_2.part
